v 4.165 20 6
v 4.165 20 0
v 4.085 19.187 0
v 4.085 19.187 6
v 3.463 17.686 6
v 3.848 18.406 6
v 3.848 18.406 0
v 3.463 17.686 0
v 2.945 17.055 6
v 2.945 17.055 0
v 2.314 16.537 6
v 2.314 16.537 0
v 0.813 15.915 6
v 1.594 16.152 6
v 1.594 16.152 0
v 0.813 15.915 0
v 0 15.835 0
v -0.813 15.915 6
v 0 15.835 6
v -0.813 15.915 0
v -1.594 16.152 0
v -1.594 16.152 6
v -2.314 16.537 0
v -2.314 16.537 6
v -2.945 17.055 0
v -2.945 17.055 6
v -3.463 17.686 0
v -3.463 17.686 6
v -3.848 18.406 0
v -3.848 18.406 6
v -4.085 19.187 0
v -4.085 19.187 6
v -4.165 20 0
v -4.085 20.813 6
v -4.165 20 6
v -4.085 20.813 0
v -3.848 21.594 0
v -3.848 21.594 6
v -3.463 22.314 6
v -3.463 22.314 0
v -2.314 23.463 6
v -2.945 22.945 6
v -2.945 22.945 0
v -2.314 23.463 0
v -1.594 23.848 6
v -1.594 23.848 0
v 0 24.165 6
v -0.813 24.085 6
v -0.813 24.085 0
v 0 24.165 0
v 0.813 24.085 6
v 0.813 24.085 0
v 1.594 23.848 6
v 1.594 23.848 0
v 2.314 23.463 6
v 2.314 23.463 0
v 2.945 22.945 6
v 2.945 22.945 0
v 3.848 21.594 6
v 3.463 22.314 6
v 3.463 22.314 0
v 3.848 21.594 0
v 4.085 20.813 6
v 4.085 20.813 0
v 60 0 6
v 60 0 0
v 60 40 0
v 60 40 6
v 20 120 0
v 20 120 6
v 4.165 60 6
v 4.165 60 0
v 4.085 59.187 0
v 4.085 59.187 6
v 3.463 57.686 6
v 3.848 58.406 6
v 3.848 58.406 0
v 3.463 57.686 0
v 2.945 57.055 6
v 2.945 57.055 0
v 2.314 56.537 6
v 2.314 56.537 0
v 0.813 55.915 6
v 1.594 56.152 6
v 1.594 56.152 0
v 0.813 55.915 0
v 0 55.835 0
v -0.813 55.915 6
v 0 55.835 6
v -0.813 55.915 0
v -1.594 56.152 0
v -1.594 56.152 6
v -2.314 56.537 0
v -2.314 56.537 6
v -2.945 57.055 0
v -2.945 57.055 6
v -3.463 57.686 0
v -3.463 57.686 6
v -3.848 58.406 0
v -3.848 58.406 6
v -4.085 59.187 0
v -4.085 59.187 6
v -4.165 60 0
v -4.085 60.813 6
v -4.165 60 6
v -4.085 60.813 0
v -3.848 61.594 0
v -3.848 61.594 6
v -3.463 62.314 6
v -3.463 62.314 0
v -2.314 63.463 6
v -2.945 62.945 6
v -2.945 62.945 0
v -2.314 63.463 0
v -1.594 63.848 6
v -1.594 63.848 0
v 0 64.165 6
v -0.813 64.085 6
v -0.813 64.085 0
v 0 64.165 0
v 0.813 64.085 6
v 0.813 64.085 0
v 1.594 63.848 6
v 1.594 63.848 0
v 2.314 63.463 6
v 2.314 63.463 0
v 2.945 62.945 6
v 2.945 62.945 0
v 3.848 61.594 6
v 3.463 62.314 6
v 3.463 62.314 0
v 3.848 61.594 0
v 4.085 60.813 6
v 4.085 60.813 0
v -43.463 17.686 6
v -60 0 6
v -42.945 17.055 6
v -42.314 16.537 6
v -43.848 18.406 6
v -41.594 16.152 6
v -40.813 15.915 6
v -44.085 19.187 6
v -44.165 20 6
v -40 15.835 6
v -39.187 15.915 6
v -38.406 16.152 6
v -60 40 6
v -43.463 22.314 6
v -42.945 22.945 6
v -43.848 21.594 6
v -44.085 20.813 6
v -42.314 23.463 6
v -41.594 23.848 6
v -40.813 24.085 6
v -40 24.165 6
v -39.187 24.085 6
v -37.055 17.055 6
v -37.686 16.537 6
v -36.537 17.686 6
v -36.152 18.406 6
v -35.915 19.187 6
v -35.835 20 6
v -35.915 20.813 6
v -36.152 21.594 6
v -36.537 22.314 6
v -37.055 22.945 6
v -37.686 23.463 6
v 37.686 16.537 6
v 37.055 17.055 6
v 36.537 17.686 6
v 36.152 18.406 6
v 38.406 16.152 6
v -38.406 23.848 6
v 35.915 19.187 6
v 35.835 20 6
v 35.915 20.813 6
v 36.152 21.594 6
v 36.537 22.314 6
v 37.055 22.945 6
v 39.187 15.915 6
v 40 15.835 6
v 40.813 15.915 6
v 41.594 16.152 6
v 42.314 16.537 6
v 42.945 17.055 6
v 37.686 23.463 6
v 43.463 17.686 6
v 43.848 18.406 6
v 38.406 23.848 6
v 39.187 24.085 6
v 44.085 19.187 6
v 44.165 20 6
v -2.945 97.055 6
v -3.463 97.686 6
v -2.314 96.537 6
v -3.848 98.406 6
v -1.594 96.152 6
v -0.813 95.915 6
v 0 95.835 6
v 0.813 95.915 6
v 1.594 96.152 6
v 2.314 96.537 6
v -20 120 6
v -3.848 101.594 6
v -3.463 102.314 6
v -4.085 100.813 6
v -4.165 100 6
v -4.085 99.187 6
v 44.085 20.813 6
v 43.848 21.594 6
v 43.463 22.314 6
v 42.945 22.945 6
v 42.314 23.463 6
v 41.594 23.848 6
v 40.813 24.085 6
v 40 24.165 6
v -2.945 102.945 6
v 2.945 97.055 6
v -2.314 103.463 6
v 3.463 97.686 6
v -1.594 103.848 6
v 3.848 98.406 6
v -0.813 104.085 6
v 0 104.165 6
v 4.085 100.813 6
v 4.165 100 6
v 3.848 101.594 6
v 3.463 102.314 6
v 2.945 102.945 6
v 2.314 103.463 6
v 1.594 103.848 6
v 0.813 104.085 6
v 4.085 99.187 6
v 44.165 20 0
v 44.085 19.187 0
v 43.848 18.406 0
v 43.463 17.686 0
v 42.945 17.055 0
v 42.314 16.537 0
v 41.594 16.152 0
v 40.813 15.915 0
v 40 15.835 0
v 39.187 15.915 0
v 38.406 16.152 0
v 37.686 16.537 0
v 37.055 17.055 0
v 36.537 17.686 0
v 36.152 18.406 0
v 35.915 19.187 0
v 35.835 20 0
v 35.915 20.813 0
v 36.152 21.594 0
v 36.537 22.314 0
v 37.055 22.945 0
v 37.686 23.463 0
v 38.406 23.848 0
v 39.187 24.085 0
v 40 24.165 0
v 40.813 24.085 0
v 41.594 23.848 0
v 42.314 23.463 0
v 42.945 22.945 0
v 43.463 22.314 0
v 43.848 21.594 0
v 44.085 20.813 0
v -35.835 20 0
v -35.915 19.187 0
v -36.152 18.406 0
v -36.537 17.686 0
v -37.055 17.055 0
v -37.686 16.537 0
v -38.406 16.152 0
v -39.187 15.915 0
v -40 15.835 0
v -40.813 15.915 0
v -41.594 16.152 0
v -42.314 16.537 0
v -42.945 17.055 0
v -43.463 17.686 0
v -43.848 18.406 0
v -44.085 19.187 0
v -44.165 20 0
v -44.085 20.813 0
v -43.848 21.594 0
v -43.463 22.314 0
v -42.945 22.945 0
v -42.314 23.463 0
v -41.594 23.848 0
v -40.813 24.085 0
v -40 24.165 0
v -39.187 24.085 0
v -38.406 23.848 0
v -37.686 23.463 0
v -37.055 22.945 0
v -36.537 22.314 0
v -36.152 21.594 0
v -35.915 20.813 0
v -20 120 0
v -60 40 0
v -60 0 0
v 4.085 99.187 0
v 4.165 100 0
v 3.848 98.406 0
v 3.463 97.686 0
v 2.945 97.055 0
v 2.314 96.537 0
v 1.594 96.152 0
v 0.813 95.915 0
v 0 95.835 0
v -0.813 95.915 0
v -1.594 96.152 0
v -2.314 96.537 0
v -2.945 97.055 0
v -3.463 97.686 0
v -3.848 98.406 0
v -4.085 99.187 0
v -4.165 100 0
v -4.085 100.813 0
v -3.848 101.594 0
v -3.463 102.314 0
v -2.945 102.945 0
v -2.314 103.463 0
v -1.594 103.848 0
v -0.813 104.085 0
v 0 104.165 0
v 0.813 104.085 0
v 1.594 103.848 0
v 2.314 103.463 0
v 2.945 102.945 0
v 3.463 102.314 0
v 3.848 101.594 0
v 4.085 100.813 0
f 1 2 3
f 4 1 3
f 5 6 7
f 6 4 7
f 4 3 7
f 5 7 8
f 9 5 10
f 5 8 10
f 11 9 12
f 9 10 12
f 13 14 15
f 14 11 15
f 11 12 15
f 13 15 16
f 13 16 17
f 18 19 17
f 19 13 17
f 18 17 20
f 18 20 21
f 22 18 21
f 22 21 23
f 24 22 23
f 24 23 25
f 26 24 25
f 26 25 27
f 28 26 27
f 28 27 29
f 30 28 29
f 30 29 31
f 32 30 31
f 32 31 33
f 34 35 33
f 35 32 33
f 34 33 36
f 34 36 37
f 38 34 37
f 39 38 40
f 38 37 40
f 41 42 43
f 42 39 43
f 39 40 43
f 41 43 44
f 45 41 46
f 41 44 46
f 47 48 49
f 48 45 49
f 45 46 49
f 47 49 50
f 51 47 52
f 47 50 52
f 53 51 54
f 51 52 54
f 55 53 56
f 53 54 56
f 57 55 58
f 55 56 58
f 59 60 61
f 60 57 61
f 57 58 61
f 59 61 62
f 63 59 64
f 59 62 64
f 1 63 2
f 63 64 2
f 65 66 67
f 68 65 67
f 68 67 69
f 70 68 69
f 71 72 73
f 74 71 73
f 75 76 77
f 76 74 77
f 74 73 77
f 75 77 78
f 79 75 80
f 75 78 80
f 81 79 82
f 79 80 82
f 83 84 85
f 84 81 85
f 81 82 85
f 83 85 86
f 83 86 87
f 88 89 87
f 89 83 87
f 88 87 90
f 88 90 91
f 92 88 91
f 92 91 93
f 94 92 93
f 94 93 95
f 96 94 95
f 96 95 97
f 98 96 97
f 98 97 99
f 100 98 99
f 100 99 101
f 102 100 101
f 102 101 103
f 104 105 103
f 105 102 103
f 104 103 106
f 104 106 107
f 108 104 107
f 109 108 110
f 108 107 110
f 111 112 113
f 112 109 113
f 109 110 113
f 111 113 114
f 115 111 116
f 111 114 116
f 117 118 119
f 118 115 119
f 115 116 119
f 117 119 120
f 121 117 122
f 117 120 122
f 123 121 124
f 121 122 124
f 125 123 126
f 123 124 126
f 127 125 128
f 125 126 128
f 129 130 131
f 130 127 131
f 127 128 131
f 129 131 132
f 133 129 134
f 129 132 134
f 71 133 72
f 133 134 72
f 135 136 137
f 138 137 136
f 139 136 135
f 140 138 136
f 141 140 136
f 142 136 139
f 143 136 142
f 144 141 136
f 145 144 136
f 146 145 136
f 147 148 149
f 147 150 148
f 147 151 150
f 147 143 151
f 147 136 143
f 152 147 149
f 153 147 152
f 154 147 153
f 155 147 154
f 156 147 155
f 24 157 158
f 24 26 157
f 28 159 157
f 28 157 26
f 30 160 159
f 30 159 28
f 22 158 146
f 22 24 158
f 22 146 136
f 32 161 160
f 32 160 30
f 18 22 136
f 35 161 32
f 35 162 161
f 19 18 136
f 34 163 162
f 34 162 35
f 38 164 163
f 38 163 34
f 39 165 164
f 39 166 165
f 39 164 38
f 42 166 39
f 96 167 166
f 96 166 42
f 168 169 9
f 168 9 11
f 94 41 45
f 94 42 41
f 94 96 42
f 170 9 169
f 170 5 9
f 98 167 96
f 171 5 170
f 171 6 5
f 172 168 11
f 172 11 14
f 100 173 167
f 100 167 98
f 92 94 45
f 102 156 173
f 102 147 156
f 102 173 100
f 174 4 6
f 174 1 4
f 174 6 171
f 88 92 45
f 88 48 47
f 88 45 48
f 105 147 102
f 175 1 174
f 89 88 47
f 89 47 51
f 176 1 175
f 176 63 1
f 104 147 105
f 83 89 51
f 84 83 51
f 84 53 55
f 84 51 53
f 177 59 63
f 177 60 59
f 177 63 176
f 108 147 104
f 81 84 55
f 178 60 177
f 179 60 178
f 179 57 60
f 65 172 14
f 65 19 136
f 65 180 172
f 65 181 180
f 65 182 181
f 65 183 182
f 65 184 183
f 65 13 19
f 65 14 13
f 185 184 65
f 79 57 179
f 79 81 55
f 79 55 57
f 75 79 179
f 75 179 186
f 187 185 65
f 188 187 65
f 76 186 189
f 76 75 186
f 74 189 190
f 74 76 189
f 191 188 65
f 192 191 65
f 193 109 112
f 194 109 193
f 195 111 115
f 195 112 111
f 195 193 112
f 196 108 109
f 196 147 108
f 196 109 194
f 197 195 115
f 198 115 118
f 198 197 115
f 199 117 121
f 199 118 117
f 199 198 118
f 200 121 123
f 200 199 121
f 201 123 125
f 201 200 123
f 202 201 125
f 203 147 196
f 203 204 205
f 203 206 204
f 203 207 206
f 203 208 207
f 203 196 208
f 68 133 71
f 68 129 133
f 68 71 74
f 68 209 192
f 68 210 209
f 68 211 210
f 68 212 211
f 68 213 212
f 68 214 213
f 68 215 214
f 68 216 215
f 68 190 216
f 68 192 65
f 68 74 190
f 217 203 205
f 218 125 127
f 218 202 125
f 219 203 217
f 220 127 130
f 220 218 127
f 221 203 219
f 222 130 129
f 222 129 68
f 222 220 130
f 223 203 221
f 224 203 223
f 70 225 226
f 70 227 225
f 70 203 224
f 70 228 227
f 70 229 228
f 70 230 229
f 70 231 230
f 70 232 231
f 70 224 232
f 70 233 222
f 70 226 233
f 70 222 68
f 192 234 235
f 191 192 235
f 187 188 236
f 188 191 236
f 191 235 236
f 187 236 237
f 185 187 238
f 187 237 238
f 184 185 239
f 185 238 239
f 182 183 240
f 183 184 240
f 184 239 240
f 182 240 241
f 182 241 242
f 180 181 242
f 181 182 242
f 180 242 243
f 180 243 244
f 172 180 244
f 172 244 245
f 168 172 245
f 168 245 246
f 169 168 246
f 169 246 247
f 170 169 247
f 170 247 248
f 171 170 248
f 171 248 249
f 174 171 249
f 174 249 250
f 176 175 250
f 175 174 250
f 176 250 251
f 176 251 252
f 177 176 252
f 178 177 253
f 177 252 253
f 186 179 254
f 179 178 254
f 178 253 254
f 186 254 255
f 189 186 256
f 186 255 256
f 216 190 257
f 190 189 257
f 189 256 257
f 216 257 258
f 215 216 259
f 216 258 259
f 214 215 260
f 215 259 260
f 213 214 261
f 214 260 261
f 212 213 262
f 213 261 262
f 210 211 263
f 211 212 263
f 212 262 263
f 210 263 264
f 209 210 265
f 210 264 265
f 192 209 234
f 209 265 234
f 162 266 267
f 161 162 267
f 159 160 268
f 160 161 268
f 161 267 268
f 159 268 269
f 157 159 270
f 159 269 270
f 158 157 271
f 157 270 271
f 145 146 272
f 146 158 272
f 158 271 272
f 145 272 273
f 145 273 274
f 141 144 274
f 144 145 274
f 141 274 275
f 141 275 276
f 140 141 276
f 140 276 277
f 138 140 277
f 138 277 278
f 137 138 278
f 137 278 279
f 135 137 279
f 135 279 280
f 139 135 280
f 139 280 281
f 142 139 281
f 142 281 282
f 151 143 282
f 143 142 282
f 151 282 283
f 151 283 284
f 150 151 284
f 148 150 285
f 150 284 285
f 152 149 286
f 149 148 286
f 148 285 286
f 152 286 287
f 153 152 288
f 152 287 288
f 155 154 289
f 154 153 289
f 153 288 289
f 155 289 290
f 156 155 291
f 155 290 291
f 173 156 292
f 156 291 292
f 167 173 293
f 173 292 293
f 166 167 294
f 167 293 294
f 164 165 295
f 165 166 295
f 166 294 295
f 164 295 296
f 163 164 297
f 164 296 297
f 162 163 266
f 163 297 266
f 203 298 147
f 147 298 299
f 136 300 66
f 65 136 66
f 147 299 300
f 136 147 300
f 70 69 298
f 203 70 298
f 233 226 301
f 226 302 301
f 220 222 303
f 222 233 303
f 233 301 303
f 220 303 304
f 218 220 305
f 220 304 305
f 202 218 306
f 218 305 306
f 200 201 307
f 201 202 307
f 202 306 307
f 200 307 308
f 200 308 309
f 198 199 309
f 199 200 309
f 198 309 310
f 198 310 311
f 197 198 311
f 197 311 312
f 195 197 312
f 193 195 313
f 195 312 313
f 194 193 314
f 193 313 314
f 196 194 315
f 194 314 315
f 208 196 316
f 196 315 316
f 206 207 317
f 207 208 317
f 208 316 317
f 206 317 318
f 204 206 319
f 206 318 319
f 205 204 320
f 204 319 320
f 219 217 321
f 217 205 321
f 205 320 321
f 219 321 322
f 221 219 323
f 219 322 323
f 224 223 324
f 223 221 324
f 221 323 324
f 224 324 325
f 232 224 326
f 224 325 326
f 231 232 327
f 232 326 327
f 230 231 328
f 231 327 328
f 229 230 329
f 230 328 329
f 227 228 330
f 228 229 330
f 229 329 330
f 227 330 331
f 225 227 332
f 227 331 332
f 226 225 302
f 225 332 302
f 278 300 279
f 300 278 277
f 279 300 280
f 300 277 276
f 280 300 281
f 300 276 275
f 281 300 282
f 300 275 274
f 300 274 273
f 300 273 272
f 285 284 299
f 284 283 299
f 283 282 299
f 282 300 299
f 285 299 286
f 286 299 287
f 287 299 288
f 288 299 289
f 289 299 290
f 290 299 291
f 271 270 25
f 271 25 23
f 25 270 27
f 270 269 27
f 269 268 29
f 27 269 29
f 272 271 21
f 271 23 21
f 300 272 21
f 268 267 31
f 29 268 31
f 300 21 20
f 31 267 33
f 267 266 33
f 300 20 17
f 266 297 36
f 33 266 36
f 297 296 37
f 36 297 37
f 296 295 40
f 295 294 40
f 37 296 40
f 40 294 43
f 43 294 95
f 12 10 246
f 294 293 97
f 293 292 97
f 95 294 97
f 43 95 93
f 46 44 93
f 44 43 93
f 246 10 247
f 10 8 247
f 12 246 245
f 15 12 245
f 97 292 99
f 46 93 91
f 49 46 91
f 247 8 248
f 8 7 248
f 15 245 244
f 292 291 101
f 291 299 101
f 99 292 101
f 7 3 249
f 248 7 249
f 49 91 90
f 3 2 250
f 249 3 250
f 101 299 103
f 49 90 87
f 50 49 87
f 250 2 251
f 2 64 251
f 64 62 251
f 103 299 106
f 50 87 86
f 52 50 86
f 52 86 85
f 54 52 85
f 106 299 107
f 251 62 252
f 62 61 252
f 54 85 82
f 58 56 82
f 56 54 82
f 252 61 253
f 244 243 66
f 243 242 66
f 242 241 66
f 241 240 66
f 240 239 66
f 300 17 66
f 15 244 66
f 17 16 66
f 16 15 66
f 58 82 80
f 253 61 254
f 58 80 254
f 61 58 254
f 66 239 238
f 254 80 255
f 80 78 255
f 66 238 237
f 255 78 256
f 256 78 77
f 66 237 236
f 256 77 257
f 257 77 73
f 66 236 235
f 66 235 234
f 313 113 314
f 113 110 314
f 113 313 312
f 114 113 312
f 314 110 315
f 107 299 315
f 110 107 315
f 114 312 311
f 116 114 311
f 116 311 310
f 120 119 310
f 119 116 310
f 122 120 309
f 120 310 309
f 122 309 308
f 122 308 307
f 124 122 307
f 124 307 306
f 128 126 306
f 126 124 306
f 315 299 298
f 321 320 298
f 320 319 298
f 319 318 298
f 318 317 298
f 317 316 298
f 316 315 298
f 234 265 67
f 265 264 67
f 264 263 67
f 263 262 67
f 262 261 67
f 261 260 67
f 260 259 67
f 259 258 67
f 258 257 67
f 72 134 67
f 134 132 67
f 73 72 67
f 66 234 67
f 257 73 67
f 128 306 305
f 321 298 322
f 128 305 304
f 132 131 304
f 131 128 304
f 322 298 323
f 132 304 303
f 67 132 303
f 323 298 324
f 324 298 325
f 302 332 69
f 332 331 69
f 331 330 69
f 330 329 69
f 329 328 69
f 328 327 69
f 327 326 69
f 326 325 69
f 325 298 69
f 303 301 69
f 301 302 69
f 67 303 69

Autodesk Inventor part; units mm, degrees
ref_plane "YZ Plane" through (0, 0, 0) normal (1, 0, 0) x (0, 1, 0)
ref_plane "XZ Plane" through (0, 0, 0) normal (0, 1, 0) x (-1, 0, 0)
ref_plane "XY Plane" through (0, 0, 0) normal (0, 0, 1) x (1, 0, 0)
sketch "Sketch_1" plane through (0, 0, 0) normal (0, 0, 1) x (1, 0, 0)
  line L0 (-60, 40) -> (-60, 0)
  line L1 (-60, 0) -> (60, 0)
  line L2 (60, 0) -> (60, 40)
  line L3 (60, 40) -> (20, 120)
  line L4 (20, 120) -> (-20, 120)
  line L5 (-20, 120) -> (-60, 40)
  circle A0 centre (40, 20) radius 4.165
  circle A1 centre (0, 60) radius 4.165
  circle A2 centre (0, 100) radius 4.165
  circle A3 centre (0, 20) radius 4.165
  circle A4 centre (-40, 20) radius 4.165
extrude "Extrusion1" add sketch "Sketch_1" along normal blind 6
properties part number "40-4340"
